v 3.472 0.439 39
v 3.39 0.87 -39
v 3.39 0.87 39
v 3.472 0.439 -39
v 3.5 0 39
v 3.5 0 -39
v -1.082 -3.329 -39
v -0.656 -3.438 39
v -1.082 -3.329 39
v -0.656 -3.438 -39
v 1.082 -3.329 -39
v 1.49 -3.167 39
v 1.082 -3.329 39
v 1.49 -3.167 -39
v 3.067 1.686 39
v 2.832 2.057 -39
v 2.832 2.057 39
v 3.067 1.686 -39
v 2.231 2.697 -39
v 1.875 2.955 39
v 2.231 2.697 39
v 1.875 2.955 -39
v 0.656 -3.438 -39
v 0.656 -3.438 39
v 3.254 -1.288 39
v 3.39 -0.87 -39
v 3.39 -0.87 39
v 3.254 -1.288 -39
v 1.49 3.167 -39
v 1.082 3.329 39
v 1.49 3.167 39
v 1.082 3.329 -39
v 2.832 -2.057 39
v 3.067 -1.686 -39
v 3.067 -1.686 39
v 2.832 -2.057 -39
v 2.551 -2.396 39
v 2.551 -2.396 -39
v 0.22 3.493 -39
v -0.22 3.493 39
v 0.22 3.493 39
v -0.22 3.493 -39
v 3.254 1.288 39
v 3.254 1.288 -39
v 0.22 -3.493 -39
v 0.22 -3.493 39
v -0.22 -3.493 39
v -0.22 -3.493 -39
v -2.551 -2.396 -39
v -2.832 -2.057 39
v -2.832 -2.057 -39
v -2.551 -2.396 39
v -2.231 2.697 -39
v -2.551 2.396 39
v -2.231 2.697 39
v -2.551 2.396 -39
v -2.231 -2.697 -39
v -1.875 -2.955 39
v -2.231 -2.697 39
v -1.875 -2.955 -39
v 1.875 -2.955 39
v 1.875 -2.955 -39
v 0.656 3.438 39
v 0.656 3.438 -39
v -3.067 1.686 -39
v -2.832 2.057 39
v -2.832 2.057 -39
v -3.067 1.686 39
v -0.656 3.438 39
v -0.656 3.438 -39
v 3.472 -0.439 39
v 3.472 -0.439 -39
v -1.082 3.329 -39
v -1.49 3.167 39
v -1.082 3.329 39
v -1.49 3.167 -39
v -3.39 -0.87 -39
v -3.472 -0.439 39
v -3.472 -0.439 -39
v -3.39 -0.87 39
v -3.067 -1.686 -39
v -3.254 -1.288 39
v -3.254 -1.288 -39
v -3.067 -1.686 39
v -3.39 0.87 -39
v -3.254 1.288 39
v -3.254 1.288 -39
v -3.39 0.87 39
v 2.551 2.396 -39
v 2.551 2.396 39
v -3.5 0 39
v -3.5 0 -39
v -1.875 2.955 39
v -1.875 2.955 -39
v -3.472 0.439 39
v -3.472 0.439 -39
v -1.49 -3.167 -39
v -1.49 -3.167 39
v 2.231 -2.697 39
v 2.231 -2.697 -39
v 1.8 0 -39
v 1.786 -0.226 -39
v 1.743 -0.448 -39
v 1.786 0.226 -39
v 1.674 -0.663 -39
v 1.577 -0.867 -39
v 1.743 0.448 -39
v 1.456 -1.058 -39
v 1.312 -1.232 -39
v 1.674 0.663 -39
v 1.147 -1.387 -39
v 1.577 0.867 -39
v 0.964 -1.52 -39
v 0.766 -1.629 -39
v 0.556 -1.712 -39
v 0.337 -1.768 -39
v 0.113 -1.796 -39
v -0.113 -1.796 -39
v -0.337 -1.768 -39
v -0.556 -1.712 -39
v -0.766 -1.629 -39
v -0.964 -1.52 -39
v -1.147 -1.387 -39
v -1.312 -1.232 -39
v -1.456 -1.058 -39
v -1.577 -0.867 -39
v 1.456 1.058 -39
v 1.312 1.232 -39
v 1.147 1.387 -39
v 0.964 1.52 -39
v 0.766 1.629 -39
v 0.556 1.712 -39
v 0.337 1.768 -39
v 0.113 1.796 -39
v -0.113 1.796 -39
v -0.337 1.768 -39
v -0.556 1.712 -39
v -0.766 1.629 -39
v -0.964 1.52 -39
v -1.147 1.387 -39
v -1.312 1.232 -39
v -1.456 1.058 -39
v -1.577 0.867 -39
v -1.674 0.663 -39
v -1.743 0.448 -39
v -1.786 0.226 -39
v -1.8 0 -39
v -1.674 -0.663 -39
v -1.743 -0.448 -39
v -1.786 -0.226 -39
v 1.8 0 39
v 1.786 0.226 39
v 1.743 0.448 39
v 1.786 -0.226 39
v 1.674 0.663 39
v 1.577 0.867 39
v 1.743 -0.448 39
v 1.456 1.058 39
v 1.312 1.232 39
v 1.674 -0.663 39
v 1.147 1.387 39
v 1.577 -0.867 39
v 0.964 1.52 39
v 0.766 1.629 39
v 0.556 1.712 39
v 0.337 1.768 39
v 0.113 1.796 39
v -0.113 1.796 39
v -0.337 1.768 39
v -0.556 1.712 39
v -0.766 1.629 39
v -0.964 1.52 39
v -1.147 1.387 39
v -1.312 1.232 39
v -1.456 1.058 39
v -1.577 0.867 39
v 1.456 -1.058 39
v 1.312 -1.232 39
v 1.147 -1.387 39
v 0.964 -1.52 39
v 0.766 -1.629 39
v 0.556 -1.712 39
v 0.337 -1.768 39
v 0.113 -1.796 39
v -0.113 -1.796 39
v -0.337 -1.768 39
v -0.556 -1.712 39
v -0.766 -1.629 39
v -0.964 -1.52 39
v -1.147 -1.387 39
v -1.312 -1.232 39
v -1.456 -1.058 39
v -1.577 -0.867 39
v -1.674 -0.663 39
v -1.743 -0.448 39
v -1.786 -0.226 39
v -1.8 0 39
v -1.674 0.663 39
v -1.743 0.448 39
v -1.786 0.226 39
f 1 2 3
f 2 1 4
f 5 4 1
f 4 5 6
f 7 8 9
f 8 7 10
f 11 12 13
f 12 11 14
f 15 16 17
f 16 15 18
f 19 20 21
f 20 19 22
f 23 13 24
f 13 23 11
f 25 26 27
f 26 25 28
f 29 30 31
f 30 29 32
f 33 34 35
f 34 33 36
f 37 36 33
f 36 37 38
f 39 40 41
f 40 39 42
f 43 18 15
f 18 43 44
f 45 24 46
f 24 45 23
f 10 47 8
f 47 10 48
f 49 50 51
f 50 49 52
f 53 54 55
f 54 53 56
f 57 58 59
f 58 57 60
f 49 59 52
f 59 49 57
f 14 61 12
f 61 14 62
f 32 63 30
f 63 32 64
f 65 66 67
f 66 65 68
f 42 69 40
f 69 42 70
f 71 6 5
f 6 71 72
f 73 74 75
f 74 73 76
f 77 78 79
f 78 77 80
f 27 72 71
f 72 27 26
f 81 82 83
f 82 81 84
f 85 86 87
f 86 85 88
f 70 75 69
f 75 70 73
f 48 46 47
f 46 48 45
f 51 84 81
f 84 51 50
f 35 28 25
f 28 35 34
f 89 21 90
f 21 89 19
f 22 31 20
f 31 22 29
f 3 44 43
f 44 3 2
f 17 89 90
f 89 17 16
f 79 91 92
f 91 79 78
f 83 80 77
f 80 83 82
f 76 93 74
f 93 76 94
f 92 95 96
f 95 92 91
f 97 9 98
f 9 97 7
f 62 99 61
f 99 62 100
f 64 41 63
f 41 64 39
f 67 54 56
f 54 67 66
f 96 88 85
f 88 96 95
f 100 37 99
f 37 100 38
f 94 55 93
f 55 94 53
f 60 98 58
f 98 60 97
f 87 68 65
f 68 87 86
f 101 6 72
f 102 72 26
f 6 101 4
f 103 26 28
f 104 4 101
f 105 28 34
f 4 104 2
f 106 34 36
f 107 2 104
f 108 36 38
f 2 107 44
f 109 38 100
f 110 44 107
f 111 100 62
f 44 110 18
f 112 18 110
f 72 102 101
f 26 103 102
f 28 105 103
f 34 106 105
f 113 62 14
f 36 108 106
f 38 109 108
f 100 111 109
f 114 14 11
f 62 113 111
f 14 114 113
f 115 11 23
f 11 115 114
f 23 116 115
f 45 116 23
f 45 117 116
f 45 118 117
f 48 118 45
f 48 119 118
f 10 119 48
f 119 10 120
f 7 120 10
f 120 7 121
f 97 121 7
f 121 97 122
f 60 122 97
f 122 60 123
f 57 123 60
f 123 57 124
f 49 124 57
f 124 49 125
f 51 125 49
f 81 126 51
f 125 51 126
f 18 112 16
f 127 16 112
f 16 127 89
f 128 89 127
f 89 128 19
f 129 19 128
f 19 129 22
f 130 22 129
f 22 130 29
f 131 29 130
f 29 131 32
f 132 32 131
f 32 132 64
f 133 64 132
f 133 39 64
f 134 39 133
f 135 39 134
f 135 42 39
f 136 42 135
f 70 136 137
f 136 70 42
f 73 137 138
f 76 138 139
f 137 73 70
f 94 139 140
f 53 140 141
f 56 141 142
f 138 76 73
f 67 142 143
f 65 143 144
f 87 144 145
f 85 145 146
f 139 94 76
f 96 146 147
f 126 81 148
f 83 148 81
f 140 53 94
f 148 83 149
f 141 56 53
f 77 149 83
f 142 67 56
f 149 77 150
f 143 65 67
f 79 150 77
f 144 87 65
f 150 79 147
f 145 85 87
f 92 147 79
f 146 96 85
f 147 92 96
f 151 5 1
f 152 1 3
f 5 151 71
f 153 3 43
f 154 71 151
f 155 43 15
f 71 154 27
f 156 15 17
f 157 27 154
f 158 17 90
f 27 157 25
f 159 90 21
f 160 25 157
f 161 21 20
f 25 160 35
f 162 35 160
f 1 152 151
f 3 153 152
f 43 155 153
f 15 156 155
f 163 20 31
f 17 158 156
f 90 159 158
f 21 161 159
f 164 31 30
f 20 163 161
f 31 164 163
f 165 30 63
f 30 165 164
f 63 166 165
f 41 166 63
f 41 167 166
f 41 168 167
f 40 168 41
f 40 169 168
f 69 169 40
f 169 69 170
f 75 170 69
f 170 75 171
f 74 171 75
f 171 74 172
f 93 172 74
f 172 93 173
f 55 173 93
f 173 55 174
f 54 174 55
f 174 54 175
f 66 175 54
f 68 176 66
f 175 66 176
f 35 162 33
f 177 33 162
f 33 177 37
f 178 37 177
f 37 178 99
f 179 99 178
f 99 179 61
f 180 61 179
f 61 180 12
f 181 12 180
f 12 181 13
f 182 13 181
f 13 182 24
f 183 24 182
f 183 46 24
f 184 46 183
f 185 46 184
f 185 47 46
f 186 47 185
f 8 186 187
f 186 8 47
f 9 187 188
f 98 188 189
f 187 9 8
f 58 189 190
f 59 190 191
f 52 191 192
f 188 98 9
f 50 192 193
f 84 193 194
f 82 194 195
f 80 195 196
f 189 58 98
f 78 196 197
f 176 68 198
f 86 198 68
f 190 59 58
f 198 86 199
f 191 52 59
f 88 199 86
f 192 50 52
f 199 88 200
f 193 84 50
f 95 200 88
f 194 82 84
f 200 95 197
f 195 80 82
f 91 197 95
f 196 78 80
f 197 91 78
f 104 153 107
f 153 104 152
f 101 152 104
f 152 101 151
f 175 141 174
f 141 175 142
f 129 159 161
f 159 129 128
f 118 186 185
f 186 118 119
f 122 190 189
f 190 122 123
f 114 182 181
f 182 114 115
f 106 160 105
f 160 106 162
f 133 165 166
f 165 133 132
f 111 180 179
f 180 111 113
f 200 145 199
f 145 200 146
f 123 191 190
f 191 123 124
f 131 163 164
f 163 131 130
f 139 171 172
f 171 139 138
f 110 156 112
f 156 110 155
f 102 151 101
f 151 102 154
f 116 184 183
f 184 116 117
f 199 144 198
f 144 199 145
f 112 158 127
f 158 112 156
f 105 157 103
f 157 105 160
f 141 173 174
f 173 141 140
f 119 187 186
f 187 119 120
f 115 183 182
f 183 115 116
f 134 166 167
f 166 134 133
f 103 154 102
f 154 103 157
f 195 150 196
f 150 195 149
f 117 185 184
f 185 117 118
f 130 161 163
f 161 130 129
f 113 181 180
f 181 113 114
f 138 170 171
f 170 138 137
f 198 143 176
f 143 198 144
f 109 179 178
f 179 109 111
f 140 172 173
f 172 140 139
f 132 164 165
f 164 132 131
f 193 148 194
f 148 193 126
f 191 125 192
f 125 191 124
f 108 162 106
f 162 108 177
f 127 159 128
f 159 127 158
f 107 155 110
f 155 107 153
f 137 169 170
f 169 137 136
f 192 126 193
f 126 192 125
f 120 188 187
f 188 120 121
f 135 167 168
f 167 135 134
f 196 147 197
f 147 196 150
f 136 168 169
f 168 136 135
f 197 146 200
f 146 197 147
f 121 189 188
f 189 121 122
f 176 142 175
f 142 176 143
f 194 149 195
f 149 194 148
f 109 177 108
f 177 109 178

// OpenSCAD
$fn = 50;


difference() {
	union() {
		translate(v = [0, 0, -39.0000000000]) {
			cylinder(h = 78, r = 3.5000000000);
		}
	}
	union() {
		#translate(v = [0, 0, -100.0000000000]) {
			cylinder(h = 200, r = 1.8000000000);
		}
	}
}
